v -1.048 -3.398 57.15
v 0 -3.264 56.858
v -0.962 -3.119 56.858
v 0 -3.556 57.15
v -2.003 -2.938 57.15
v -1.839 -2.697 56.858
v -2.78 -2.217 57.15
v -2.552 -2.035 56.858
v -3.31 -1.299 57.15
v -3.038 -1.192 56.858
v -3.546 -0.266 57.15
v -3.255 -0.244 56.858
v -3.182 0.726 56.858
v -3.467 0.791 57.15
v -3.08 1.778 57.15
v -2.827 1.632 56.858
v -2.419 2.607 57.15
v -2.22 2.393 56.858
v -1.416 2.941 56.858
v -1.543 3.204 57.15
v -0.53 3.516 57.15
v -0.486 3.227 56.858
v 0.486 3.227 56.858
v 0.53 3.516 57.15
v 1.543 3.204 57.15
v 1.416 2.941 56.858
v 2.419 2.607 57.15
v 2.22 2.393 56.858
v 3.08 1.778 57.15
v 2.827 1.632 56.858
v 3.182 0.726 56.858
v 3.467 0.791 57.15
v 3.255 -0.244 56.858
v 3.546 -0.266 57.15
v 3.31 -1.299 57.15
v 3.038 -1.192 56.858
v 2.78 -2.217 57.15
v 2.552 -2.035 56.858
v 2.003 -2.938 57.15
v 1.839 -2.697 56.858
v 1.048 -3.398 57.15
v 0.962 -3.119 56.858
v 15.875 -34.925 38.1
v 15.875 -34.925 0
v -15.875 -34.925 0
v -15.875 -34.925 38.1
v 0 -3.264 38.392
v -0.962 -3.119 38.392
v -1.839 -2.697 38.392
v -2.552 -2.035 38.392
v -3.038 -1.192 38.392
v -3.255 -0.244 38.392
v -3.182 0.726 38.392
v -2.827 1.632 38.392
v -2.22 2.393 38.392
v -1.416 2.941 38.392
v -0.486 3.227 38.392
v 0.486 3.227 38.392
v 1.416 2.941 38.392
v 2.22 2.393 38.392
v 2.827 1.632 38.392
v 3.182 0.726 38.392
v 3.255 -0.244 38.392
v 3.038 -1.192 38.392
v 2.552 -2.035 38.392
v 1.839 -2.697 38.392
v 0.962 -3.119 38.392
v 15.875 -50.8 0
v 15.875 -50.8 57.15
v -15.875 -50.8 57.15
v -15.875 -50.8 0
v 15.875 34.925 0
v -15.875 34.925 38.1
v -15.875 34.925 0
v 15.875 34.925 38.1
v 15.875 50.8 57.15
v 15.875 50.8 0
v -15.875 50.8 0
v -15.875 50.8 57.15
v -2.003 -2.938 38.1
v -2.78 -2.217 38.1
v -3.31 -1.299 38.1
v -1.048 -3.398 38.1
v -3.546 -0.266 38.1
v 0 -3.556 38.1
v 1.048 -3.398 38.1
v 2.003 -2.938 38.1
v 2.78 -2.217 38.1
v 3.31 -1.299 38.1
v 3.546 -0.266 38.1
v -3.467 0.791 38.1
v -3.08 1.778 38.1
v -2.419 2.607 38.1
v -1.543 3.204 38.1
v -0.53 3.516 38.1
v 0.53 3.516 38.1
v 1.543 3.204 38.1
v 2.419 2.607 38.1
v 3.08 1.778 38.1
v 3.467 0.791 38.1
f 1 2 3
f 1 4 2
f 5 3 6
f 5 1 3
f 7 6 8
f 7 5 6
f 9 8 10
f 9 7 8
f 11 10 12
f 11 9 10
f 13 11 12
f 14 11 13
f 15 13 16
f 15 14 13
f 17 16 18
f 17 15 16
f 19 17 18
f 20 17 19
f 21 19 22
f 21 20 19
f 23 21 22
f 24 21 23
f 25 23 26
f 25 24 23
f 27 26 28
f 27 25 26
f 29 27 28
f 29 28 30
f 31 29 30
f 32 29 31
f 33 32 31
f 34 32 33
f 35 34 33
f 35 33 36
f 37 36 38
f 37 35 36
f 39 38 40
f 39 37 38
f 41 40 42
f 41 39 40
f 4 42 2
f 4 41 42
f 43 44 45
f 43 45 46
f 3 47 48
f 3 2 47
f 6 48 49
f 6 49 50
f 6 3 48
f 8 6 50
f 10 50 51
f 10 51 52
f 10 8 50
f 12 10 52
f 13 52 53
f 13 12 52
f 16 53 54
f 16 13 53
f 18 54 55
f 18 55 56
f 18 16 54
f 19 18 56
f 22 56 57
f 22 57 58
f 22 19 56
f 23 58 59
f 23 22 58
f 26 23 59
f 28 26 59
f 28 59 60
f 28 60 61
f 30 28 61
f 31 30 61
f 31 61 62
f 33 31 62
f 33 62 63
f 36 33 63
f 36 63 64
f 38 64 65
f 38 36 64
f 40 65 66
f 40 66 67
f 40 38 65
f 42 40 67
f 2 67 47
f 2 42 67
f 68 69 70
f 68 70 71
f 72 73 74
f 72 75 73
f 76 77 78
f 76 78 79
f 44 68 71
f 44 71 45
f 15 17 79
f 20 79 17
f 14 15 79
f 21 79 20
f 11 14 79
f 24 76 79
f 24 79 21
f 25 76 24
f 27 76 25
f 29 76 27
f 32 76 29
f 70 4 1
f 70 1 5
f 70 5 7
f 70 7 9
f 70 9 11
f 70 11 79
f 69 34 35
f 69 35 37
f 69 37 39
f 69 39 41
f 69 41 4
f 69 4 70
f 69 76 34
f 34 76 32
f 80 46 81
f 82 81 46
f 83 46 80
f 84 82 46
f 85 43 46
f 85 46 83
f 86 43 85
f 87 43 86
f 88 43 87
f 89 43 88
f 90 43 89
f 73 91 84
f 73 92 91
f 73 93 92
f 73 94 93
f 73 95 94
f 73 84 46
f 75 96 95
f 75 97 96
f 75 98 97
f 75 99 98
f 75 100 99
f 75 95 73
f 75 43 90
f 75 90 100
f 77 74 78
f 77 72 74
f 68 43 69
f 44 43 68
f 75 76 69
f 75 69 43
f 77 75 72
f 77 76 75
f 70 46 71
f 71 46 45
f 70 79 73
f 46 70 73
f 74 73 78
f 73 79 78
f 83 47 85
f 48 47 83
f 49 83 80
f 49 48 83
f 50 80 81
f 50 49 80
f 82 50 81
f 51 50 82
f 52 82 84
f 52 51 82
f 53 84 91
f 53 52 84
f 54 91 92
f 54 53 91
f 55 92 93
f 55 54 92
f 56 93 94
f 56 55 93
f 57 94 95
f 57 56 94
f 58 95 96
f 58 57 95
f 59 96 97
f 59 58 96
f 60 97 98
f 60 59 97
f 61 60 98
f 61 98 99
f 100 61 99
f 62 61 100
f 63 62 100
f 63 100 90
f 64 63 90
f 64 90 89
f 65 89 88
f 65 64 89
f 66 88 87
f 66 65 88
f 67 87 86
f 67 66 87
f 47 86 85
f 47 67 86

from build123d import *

# Parameters (mm, degrees)
BOSS_EXTRUDE1_DEPTH = 15.875


with BuildPart() as part:
    # Sketch1 → Boss-Extrude1 (new, symmetric)
    with BuildSketch(Plane(origin=(0, 0, 0), x_dir=(0, 0, -1), z_dir=(1, 0, 0))):
        Polygon((0, 34.925), (0, 50.8), (-57.15, 50.8), (-57.15, -50.8), (0, -50.8), (0, -34.925), (-38.1, -34.925), (-38.1, 34.925), align=None)
    extrude(amount=BOSS_EXTRUDE1_DEPTH, both=True)

    # Sketch2 → F (0.257) Diameter Hole1 (revolve, cut)
    with BuildSketch(Plane(origin=(0, 0, 57.15), x_dir=(0, -1, 0), z_dir=(1, 0, 0))):
        Polygon((0, 0), (0, 19.05), (3.556, 19.05), (3.2639, 18.7579), (3.2639, 0.2921), (3.556, 0), align=None)
    revolve(axis=Axis((0, 0, 63.5), (0, 0, -1)), mode=Mode.SUBTRACT)


solid = part.part
